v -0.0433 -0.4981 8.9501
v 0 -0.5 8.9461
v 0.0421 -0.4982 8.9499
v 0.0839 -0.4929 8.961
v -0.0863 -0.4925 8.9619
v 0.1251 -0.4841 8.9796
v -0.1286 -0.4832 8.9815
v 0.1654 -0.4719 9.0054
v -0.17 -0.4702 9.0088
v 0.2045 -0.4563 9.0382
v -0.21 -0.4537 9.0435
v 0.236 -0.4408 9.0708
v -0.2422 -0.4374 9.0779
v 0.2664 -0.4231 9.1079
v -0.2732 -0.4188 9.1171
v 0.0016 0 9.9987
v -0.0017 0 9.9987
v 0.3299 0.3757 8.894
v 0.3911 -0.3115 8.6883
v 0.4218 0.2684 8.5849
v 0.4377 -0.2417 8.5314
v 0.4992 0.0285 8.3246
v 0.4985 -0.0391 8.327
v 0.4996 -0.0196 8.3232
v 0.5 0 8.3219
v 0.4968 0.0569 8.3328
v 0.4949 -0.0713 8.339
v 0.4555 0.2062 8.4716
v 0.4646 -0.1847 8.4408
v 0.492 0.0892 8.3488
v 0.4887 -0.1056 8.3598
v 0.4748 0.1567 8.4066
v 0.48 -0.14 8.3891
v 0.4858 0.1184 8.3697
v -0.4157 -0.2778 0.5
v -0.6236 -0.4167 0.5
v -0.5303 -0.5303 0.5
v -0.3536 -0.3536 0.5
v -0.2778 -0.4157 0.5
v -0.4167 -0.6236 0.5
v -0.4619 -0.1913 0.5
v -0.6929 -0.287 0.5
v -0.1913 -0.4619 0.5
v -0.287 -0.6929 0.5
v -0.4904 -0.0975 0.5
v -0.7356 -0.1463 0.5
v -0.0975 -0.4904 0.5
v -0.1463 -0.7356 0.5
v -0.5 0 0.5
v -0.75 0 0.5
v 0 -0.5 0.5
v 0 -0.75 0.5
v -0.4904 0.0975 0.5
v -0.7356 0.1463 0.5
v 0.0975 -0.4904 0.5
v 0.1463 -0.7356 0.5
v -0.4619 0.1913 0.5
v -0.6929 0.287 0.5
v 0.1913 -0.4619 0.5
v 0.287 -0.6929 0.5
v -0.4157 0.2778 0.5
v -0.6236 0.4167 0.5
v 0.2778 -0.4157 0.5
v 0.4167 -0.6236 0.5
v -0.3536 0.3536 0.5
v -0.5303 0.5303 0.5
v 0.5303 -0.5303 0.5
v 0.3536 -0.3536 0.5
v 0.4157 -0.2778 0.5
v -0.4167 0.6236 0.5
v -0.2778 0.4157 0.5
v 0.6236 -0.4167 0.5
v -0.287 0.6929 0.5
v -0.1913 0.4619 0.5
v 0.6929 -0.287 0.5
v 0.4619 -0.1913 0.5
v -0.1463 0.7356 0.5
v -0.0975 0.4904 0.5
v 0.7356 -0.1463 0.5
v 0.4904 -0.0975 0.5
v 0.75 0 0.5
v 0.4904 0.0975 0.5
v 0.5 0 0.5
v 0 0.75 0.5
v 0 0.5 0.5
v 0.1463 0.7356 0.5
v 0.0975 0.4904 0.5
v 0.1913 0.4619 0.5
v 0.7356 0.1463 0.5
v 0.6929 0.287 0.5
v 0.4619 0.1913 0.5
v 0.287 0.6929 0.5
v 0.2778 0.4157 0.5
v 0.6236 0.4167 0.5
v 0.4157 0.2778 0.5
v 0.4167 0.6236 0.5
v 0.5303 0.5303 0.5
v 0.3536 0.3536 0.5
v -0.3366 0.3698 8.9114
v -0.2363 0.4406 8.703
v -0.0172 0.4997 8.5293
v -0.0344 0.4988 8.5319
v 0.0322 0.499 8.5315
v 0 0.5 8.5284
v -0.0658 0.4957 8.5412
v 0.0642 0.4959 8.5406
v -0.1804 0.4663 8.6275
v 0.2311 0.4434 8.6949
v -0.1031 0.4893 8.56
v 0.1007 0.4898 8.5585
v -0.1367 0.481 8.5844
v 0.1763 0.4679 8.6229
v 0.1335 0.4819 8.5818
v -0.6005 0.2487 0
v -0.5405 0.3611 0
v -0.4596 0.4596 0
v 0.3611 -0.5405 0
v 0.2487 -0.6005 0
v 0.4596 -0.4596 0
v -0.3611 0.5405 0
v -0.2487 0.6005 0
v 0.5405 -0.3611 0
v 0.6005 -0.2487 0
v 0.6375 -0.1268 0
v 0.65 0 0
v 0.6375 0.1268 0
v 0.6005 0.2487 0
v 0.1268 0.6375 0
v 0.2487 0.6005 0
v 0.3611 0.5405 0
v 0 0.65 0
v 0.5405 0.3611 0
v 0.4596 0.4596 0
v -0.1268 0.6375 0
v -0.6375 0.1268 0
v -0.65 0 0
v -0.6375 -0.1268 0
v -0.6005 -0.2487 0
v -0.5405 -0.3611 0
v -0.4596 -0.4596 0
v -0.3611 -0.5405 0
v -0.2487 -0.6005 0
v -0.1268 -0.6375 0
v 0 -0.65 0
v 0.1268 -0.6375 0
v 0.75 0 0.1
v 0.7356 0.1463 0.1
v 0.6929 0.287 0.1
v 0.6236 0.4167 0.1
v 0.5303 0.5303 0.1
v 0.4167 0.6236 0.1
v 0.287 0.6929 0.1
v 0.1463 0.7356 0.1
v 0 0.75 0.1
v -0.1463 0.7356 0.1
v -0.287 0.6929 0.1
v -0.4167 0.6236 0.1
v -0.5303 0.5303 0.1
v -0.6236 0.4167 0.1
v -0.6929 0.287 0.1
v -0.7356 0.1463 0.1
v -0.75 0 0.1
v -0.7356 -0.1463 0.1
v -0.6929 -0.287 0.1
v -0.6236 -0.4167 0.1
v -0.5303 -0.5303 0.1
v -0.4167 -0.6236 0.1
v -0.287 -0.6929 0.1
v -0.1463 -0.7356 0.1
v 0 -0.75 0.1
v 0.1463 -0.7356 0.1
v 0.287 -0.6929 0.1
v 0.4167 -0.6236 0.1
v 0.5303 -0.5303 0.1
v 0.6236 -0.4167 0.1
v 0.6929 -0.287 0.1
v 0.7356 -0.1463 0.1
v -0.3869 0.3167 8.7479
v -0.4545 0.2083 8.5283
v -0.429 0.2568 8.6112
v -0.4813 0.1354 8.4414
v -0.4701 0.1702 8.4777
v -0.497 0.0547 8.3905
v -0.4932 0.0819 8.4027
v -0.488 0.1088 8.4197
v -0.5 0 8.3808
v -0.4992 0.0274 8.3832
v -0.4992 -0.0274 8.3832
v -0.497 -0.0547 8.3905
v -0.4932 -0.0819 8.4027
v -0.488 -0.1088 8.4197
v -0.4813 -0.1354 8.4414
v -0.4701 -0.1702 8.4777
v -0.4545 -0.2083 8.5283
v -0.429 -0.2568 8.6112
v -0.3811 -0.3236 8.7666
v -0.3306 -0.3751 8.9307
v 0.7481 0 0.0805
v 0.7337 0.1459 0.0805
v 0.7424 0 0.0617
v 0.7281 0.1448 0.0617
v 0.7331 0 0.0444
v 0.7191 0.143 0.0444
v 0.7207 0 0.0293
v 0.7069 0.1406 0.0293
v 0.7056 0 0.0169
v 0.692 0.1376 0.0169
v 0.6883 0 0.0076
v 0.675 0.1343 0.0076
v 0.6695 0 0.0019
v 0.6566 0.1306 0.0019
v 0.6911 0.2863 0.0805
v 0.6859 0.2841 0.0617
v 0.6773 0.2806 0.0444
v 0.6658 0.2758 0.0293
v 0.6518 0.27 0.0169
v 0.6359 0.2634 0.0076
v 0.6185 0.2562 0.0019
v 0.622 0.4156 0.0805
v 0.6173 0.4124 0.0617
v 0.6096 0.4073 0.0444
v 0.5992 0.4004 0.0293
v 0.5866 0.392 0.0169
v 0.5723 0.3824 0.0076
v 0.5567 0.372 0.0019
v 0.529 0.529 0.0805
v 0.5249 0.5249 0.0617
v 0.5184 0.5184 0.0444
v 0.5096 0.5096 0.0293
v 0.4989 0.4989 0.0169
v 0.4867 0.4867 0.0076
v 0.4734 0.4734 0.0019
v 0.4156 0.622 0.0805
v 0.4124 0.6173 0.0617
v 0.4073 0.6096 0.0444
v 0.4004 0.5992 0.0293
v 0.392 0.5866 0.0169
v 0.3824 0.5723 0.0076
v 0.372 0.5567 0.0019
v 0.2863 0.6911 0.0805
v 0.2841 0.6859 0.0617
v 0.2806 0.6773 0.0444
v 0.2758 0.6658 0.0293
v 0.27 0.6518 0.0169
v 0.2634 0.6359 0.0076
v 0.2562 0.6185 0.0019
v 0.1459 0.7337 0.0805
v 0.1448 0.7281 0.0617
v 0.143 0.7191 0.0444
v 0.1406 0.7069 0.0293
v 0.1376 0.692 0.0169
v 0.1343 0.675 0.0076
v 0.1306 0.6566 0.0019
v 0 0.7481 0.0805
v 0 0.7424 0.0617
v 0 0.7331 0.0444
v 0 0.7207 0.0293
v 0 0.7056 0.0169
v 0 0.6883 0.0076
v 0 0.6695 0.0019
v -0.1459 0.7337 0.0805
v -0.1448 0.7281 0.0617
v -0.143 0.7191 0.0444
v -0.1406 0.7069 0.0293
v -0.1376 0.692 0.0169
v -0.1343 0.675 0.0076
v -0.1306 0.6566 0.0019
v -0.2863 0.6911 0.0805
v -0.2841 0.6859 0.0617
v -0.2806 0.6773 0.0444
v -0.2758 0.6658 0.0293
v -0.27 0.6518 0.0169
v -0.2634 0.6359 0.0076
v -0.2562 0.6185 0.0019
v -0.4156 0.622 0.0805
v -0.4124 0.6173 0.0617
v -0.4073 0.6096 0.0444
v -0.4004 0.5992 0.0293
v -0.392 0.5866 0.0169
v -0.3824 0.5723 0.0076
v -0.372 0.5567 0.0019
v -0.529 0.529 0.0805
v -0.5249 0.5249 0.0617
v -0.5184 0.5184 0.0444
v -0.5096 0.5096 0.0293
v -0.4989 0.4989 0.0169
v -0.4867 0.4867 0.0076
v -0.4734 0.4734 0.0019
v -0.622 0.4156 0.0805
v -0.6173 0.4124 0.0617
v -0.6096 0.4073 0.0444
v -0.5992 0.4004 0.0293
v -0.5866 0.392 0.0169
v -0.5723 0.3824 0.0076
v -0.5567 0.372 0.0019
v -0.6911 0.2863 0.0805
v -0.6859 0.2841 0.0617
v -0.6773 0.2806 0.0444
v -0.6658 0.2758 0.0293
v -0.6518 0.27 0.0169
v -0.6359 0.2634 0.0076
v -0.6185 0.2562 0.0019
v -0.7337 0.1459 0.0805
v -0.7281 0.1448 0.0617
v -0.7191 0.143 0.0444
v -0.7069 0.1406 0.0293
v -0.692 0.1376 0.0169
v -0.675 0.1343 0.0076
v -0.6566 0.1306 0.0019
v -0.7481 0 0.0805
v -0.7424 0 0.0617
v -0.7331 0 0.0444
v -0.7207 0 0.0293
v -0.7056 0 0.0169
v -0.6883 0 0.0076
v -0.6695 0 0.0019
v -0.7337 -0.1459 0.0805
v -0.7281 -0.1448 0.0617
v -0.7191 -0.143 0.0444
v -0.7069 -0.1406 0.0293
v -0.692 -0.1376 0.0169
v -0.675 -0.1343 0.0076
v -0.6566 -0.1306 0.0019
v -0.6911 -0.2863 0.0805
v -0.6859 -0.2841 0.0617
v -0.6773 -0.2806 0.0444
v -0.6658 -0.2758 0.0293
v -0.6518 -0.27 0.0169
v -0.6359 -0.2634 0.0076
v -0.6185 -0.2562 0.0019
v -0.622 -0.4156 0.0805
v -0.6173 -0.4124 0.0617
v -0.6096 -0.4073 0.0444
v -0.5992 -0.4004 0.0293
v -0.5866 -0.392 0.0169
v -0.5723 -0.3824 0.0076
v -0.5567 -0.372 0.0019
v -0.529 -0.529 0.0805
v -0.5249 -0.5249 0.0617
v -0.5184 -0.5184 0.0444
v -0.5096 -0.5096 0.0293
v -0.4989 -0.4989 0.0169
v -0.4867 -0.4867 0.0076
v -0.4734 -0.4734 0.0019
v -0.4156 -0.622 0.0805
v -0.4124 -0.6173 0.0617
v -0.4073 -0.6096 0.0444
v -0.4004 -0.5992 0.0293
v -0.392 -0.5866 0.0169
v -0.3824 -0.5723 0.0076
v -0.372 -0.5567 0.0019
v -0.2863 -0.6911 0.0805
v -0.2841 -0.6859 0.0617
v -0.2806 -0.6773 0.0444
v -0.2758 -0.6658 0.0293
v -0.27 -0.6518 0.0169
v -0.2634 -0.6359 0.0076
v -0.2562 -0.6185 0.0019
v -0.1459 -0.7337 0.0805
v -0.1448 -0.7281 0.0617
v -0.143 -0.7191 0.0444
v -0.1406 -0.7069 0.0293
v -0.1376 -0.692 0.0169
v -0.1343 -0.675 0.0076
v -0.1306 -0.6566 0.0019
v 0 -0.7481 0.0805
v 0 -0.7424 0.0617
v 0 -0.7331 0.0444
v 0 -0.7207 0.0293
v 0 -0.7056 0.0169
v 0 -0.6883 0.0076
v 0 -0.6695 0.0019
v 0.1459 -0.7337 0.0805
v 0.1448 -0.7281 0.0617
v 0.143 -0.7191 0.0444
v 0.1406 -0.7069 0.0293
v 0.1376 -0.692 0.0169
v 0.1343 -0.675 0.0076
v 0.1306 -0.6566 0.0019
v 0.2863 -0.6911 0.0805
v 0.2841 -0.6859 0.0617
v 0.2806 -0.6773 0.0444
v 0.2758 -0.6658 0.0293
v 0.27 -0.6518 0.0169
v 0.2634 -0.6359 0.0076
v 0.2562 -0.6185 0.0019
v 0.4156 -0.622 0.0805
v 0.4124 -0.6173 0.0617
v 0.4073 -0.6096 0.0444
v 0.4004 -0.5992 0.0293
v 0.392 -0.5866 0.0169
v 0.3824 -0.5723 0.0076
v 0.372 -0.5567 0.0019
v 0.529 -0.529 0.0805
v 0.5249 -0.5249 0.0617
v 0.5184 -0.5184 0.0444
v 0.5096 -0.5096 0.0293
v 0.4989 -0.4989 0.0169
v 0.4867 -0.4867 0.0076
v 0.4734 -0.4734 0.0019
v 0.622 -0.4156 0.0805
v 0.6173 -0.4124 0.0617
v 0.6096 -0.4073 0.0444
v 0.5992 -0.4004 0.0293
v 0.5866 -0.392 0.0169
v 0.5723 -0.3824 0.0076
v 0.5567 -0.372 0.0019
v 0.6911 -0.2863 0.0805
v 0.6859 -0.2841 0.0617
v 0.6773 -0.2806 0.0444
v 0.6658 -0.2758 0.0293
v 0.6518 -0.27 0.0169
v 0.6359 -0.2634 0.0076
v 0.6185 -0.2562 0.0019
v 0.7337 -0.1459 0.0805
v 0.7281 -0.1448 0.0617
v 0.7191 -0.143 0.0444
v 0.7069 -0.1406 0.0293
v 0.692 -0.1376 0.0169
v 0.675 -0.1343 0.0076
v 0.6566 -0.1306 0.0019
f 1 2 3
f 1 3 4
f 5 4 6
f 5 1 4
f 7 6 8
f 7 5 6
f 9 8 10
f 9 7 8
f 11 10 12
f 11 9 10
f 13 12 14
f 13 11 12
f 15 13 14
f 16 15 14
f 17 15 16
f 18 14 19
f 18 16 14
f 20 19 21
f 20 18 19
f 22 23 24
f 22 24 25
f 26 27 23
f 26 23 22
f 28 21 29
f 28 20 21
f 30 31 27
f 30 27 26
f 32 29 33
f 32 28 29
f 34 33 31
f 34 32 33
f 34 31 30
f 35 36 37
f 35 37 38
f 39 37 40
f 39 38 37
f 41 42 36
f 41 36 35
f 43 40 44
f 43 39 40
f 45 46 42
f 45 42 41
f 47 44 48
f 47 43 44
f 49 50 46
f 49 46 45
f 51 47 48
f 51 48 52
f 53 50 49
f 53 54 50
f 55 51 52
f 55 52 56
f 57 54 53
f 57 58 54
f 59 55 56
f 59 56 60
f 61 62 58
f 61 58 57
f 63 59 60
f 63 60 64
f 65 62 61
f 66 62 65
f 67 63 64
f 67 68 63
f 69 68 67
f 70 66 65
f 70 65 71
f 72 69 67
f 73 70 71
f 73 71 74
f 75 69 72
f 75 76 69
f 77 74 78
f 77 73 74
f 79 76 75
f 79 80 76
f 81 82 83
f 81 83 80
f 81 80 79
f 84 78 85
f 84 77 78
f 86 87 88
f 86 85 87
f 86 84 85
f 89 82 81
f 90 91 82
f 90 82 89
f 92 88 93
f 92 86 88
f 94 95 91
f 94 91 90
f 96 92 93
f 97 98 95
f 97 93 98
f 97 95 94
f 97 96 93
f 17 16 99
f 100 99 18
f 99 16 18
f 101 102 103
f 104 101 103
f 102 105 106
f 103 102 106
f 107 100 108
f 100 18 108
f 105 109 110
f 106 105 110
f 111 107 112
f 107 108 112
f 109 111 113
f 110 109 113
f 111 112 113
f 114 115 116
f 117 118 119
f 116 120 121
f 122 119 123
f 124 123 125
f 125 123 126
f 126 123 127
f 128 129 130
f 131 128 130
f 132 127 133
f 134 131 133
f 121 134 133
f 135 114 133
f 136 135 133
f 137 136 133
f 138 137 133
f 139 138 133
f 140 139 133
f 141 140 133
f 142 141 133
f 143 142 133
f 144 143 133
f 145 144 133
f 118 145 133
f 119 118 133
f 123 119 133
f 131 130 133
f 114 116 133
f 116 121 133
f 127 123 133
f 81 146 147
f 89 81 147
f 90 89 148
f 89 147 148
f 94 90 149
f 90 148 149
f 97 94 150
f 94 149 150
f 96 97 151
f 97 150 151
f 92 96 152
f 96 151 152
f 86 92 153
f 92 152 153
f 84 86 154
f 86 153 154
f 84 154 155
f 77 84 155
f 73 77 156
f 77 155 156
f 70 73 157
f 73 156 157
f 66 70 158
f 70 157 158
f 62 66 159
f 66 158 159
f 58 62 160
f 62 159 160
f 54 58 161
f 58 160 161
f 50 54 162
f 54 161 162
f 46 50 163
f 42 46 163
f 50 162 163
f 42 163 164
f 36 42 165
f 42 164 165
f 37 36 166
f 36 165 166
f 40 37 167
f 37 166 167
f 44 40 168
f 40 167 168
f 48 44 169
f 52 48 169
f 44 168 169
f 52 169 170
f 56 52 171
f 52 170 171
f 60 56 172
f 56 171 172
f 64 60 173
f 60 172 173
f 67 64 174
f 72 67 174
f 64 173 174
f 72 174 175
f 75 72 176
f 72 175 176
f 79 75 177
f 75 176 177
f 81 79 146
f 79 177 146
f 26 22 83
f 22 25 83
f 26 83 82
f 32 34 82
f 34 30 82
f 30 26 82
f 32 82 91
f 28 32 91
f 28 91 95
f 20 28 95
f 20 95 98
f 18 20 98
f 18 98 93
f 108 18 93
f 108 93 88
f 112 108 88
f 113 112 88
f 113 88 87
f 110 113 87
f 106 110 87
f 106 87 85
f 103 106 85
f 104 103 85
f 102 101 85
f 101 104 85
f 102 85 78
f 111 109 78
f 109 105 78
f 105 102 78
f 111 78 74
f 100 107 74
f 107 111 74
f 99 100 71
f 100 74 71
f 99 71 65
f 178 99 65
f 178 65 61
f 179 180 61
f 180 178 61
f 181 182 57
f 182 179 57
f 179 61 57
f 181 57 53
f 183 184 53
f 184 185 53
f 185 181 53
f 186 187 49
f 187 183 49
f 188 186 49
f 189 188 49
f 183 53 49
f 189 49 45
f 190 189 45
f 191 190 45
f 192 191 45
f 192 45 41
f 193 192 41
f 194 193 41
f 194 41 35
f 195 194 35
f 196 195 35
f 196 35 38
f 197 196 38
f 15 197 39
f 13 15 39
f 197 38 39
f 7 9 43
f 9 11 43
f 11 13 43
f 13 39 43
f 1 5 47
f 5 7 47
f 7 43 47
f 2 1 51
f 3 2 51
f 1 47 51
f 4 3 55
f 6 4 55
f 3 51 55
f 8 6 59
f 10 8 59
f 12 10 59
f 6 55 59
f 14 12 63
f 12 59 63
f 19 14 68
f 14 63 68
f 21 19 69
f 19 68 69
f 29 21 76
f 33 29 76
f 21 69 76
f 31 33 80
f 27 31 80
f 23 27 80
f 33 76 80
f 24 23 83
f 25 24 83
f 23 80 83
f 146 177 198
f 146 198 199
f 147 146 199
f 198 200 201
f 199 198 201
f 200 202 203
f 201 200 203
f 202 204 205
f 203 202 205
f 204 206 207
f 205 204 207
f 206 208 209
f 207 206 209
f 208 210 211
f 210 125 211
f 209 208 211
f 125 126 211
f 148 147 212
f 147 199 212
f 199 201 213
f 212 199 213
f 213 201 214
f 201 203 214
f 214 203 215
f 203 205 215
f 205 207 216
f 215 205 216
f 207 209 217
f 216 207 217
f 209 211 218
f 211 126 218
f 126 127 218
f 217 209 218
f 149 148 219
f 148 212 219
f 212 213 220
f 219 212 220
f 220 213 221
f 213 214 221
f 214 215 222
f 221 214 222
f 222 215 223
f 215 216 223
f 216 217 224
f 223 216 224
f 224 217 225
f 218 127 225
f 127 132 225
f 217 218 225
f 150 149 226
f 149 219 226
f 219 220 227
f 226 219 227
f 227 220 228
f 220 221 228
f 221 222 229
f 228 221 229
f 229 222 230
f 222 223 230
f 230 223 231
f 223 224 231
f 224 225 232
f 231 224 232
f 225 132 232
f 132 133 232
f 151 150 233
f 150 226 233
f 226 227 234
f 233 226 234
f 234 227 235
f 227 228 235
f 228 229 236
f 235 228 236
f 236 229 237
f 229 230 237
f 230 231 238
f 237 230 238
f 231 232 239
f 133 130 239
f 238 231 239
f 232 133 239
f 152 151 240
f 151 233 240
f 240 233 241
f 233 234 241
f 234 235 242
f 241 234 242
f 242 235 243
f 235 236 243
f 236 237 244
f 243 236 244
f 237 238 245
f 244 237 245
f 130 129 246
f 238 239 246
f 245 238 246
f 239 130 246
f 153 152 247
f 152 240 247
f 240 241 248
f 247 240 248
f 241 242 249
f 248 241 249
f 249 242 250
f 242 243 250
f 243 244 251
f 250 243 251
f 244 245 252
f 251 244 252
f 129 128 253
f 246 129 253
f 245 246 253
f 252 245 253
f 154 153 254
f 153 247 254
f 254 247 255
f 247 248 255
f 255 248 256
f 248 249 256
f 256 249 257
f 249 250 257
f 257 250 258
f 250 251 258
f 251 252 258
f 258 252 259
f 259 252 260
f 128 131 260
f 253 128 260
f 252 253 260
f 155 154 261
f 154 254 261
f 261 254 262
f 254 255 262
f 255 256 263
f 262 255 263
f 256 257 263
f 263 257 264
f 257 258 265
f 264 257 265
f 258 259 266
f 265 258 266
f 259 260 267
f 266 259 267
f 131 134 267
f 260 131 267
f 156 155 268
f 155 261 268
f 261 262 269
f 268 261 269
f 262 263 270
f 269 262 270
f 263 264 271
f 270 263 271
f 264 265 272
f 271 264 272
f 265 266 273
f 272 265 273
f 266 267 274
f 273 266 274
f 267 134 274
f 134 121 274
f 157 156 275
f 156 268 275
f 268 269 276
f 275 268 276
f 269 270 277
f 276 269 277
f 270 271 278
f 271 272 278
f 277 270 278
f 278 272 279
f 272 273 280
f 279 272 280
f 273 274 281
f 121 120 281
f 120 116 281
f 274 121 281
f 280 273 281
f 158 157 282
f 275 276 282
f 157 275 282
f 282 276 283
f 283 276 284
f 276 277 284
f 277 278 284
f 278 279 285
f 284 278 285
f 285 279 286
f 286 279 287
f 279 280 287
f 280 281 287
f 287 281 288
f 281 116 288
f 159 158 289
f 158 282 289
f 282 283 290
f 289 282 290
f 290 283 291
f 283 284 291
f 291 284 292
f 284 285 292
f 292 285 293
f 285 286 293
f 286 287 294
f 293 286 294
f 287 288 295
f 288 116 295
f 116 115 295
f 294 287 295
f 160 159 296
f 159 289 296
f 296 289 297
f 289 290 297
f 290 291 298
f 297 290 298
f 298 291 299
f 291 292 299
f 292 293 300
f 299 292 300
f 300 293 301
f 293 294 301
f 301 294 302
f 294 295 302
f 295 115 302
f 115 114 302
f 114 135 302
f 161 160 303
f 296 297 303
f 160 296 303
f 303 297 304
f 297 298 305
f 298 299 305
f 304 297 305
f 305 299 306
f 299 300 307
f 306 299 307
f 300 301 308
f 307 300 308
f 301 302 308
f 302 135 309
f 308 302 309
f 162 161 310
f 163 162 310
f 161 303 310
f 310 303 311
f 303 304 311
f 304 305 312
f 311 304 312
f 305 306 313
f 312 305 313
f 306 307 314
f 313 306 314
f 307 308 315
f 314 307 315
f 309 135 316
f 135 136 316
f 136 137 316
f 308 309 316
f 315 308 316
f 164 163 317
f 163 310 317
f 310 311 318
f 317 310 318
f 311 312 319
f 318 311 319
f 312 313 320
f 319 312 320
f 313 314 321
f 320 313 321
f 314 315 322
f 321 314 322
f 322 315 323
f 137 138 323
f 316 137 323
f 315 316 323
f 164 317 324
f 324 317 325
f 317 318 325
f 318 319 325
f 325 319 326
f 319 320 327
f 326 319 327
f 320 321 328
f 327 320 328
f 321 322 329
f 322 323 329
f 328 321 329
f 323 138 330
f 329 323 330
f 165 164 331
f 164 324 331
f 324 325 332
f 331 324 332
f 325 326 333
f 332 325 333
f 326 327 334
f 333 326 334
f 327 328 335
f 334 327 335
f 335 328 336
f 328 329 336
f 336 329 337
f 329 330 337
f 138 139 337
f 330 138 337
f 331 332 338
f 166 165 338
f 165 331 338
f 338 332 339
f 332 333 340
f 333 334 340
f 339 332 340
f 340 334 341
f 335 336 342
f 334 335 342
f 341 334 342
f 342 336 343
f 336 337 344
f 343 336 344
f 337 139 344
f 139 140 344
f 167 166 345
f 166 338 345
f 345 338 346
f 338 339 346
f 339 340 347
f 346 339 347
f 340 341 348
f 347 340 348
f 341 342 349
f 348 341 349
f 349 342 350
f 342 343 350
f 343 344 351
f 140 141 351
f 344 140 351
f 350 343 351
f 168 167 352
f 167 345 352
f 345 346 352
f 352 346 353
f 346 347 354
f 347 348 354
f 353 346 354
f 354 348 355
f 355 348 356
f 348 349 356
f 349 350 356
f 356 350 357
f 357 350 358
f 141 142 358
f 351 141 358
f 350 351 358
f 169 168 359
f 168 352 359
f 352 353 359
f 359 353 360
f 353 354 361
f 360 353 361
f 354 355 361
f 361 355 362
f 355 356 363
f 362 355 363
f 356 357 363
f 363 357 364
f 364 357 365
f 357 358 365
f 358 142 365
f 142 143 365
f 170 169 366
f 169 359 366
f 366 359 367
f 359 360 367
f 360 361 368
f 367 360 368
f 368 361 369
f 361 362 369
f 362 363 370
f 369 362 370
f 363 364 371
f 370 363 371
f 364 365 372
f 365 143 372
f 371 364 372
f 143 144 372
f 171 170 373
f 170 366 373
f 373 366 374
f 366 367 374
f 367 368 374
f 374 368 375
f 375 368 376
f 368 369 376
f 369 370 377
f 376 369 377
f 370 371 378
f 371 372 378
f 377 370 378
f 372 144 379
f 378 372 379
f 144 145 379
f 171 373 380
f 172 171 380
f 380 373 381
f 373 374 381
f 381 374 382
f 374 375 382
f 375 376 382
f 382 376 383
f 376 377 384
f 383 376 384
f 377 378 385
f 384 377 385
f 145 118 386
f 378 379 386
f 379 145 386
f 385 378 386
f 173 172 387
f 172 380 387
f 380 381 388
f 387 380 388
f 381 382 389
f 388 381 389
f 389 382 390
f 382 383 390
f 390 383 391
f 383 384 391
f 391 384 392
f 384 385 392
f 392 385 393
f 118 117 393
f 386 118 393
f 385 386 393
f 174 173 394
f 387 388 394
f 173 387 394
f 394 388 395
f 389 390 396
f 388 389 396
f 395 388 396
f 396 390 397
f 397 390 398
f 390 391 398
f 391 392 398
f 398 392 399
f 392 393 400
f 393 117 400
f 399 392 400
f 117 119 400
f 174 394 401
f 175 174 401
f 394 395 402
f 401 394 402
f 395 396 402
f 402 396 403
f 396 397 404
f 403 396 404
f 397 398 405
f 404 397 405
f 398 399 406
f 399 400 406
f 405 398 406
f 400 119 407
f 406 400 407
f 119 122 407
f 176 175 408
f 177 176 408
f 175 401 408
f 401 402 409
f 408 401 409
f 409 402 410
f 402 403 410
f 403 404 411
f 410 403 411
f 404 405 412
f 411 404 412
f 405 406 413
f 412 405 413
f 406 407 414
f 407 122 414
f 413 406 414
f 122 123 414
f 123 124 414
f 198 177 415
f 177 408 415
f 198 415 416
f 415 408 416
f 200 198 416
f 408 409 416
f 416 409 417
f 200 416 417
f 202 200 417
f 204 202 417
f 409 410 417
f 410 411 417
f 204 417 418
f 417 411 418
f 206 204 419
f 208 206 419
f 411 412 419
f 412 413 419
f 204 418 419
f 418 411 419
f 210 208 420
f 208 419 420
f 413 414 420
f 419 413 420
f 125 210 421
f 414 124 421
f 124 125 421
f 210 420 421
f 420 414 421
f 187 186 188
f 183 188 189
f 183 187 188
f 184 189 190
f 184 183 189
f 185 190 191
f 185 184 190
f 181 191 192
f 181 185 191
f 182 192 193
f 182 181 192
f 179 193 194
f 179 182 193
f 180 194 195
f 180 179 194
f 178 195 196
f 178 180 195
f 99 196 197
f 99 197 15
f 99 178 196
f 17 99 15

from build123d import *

# Parameters (mm, degrees)
F0_R          = 0.5
F1_DEPTH      = 10
F0_R_2        = 0.75
F2_DEPTH      = 0.5
F3_R          = 0.1
F5_DEPTH      = 25
F5_DEPTH_BACK = 25
F7_DEPTH      = 25
F7_DEPTH_BACK = 25


with BuildPart() as f1:
    # F0 (on Top) → F1 (new body)
    with BuildSketch(Plane.XY):
        Circle(F0_R)
    extrude(amount=F1_DEPTH)

    # F0 (on Top) → F2 (join)
    with BuildSketch(Plane.XY):
        Circle(F0_R_2)
        Circle(F0_R, mode=Mode.SUBTRACT)
    extrude(amount=F2_DEPTH)

    # F3
    f3_edges = [f1.edges().sort_by_distance(p)[0] for p in [
        (-0.75, 0, 0),
    ]]
    fillet(f3_edges, radius=F3_R)

    # F4 (on Right) → F5 (cut, two sides)
    with BuildSketch(Plane.YZ) as f5_sk:
        Polygon((-1.2106864015, 7.4500655755), (0, 9.998658672), (0.8667384973, 7.4500655755), (0.8667384973, 10.8232041821), (-1.2106864015, 10.8232041821), (-1.2106864015, 7.4928989634), align=None)
    extrude(amount=-F5_DEPTH, mode=Mode.SUBTRACT)
    extrude(f5_sk.sketch, amount=F5_DEPTH_BACK, mode=Mode.SUBTRACT)

    # F6 (on Front) → F7 (cut, two sides)
    with BuildSketch(Plane.XZ) as f7_sk:
        Polygon((-0.8896822692, 7.1156308986), (0, 10.0040659308), (0.8585277828, 7.1156308986), (1.0901562637, 10.4937674478), (-0.8896822692, 10.4937674478), align=None)
    extrude(amount=F7_DEPTH, mode=Mode.SUBTRACT)
    extrude(f7_sk.sketch, amount=-F7_DEPTH_BACK, mode=Mode.SUBTRACT)


solid = f1.part
